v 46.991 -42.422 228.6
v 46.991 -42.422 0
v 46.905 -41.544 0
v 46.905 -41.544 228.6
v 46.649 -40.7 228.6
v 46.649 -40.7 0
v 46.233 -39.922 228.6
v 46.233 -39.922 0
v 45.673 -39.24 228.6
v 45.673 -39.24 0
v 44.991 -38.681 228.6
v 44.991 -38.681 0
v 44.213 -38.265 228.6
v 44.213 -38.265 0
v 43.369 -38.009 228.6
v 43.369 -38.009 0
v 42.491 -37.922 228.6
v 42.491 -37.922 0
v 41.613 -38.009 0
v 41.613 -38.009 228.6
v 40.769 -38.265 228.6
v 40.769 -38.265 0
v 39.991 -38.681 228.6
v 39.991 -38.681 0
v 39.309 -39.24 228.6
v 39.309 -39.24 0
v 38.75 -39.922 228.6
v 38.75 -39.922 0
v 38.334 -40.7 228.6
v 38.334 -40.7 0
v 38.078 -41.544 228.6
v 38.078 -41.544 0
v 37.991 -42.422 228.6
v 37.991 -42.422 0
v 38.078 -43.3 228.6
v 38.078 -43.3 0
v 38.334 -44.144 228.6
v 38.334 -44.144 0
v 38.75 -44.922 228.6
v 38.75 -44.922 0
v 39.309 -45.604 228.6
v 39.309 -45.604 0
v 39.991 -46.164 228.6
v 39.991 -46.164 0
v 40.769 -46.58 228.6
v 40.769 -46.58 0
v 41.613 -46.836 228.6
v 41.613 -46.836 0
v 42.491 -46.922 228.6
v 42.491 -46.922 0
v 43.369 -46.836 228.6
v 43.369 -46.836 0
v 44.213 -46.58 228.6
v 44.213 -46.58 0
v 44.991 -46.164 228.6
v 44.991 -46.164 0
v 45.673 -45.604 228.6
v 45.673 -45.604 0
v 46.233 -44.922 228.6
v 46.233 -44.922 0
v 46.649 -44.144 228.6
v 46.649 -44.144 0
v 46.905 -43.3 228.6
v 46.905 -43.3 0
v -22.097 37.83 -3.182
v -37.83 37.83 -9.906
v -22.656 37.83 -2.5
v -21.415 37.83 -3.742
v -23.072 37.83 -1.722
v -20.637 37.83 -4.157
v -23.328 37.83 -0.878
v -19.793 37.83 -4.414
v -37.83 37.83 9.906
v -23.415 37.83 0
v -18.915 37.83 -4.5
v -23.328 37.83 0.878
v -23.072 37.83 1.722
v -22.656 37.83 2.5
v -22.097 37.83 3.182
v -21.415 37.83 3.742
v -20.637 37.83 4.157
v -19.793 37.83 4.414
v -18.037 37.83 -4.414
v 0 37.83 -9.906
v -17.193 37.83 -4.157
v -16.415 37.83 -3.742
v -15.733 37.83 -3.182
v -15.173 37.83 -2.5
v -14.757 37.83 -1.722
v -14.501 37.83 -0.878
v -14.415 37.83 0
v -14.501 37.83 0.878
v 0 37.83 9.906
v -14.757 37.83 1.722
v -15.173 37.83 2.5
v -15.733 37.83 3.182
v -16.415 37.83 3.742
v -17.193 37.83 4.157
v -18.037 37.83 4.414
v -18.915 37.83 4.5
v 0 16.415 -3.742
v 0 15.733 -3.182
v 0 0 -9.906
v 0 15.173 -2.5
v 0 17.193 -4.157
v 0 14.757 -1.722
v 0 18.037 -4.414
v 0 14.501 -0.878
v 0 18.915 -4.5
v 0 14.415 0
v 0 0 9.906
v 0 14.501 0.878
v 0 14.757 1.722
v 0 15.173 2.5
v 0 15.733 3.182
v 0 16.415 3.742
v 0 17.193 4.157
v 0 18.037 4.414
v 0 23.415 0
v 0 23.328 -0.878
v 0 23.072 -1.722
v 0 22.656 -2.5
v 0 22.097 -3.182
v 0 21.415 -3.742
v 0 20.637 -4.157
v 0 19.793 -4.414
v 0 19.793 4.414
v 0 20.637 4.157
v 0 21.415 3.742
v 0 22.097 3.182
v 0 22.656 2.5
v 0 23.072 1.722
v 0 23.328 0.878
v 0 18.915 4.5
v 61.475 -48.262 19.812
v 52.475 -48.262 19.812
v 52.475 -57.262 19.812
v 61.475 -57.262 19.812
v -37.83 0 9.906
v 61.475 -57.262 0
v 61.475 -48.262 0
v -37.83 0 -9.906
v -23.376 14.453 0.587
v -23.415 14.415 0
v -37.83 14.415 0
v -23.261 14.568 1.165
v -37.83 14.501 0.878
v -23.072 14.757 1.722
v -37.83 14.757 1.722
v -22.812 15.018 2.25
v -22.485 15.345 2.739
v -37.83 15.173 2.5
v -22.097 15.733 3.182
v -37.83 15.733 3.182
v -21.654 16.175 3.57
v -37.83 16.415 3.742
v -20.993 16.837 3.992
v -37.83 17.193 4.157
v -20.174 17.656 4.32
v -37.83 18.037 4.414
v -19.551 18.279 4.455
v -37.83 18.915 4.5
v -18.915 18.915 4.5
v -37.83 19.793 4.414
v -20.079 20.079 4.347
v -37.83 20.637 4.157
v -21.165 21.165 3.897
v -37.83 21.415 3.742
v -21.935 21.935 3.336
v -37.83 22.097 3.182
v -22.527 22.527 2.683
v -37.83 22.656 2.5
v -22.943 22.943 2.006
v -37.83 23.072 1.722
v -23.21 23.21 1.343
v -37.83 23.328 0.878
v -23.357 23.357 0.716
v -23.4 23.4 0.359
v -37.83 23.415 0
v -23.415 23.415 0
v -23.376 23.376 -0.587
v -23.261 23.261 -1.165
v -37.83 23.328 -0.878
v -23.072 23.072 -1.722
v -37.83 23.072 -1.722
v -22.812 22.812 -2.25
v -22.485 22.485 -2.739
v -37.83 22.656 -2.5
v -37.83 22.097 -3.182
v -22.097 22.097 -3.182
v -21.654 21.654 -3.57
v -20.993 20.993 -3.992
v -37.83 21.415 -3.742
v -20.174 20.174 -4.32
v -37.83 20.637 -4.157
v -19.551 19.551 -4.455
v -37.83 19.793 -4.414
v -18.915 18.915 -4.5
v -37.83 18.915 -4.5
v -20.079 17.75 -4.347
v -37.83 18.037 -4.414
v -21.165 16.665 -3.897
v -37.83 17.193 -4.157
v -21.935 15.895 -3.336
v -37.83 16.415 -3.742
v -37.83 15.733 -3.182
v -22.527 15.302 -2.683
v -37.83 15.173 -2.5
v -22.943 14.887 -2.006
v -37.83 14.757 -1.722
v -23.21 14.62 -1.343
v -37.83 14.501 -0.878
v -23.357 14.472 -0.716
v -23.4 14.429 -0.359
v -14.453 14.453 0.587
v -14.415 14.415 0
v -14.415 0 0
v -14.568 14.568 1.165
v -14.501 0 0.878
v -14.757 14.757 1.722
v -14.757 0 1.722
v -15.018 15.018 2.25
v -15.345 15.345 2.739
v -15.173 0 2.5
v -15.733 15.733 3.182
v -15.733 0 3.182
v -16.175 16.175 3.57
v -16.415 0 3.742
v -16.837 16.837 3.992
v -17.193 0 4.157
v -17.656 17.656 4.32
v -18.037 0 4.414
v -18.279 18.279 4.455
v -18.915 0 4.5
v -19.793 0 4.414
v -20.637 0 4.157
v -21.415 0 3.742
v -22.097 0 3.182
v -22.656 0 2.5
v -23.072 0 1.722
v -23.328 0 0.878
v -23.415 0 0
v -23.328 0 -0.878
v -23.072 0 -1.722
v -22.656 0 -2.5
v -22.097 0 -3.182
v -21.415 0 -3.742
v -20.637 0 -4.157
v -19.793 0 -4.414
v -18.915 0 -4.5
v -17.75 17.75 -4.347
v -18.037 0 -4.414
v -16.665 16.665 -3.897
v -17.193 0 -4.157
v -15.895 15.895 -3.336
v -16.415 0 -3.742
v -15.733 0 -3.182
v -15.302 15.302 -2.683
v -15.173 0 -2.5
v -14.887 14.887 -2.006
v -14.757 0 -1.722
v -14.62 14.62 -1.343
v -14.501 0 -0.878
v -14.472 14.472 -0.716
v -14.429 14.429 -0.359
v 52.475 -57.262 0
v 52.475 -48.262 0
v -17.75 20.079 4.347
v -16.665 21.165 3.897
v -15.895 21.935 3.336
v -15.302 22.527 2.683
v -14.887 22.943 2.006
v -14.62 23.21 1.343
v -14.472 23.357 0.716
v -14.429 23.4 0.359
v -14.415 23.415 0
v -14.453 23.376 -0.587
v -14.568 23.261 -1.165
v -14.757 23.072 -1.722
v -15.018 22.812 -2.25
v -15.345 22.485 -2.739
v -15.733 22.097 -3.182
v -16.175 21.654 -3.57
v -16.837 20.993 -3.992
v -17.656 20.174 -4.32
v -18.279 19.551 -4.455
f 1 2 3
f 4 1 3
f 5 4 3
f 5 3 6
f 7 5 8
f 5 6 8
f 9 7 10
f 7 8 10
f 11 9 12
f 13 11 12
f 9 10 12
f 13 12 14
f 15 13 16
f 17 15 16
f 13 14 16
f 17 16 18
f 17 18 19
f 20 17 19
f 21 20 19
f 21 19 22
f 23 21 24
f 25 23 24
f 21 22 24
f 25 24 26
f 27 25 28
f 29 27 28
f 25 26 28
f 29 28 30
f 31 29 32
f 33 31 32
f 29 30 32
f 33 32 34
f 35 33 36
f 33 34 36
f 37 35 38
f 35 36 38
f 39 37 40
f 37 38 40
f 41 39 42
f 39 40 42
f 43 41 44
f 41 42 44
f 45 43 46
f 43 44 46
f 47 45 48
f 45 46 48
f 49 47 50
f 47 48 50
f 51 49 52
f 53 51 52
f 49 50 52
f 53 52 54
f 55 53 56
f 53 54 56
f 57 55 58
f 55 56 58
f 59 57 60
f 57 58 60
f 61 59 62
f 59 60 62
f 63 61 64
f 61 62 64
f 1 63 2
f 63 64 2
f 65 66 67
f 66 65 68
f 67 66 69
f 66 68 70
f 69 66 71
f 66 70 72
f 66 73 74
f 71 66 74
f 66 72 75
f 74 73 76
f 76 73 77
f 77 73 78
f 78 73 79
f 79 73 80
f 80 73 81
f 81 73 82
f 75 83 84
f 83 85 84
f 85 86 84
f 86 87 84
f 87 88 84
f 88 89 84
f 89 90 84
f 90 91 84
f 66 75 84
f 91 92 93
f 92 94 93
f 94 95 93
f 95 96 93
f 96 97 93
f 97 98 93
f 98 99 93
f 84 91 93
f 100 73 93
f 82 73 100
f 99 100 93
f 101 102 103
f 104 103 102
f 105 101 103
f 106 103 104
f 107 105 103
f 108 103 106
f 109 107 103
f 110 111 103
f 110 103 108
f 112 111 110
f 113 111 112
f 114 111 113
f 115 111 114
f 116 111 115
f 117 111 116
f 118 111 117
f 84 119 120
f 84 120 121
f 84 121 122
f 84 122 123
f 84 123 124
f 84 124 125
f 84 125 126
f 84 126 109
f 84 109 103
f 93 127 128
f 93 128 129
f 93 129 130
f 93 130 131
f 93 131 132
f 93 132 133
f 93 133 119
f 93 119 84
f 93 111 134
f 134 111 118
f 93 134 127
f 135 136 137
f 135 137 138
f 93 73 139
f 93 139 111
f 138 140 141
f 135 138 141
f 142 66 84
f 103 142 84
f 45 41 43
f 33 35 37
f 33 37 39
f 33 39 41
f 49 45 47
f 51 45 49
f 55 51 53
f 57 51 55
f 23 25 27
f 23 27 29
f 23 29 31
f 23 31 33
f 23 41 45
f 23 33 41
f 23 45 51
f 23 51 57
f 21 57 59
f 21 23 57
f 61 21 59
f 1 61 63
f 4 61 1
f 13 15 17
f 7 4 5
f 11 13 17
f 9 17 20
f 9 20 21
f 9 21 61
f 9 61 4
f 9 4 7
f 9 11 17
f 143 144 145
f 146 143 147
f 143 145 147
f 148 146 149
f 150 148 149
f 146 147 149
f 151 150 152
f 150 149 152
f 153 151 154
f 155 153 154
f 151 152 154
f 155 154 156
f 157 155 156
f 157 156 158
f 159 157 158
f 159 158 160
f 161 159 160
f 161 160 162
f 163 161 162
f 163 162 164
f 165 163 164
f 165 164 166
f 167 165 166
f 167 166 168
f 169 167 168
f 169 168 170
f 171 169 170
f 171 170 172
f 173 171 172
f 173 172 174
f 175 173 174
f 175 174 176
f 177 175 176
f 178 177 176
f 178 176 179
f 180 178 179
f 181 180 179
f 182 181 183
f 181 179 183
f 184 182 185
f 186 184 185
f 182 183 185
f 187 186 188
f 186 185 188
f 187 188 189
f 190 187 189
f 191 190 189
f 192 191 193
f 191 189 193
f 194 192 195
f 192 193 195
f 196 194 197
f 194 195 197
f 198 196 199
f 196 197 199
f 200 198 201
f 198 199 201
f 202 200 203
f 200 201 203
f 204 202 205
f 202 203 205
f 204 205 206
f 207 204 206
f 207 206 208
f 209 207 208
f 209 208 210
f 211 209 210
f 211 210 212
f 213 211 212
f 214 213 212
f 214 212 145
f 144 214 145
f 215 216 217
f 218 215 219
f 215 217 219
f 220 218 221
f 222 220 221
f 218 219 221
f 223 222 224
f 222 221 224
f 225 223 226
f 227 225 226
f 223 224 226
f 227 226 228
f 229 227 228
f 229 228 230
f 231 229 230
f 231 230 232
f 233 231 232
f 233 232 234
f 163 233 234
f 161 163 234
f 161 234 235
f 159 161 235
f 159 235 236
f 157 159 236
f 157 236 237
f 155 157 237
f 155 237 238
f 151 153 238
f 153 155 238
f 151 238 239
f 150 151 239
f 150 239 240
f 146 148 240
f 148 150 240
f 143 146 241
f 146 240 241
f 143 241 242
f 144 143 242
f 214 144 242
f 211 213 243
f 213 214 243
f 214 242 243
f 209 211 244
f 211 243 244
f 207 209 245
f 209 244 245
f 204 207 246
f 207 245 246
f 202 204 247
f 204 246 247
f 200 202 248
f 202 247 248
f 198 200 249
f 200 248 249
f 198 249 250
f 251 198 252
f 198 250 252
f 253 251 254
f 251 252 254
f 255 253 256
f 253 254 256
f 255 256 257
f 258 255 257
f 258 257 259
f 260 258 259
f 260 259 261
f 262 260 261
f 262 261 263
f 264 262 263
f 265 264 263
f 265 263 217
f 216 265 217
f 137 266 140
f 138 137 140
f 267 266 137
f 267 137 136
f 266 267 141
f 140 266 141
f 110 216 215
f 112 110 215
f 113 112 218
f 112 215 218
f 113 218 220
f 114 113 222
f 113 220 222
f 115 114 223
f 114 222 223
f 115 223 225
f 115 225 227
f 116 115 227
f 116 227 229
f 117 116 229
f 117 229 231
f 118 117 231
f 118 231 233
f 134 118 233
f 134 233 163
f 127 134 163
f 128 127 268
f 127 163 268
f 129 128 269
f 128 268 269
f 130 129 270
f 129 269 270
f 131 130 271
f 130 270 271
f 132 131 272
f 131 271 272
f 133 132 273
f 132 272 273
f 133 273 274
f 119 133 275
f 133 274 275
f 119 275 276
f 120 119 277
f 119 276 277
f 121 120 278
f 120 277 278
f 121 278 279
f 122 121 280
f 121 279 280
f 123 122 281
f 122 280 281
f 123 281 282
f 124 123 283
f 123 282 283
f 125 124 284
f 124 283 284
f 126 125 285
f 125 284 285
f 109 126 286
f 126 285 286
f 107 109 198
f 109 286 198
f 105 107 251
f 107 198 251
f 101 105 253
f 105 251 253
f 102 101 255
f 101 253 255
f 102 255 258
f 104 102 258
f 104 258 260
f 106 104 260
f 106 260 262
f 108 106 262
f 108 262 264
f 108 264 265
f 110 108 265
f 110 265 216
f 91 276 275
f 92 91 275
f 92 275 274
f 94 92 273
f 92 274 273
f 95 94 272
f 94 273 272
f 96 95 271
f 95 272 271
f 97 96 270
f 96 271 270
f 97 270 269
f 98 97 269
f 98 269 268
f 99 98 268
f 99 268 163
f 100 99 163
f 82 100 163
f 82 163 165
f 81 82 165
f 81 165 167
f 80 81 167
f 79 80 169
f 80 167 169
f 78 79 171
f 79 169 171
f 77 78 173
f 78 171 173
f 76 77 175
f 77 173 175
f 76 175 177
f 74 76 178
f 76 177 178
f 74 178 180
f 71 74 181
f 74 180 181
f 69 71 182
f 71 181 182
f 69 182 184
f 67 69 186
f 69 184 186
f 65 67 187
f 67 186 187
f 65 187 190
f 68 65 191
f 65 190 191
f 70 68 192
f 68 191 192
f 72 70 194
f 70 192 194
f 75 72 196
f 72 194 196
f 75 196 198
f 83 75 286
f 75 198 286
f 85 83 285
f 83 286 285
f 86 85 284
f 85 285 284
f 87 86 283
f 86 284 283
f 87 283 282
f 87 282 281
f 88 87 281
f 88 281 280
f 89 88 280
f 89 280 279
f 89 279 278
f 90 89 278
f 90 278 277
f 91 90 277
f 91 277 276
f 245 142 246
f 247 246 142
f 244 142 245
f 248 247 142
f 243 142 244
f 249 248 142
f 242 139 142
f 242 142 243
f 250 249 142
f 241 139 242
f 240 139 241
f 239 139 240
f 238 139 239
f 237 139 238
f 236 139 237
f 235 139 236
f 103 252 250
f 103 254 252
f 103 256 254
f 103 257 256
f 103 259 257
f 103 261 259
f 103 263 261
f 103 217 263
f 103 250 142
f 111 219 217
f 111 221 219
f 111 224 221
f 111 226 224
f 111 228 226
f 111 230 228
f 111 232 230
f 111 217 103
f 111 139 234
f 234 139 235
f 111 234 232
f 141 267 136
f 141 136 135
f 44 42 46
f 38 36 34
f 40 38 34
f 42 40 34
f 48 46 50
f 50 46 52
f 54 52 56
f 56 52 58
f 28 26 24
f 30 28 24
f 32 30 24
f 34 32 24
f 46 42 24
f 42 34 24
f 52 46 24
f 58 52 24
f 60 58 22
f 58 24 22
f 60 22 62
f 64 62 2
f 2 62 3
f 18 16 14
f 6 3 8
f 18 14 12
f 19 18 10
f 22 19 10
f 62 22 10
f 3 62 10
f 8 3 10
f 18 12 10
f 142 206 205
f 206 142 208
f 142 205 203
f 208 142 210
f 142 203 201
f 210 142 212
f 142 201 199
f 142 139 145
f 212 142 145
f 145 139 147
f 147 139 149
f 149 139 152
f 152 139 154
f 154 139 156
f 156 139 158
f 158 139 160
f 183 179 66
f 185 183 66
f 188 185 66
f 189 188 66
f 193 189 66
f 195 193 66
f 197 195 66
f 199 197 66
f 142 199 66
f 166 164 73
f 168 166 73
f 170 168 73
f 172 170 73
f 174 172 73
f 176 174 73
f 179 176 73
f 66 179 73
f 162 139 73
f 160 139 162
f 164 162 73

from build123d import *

# Parameters (mm, degrees)
F0_W      = 37.829503
F0_H      = 37.829503
F1_DEPTH  = 9.906
F6_D      = 9
F7_D      = 9
F8_R      = 4.5
F9_DEPTH  = 228.6
F10_W     = 9
F10_H     = 9
F11_DEPTH = 19.812


with BuildPart() as f1:
    # F0 (on Top) → F1 (new body, symmetric)
    with BuildSketch(Plane.XY):
        with Locations((-18.914751, 18.914751)):
            Rectangle(F0_W, F0_H)
    extrude(amount=F1_DEPTH, both=True)

    # F6 (through all)
    with Locations(Plane.YZ):
        with Locations((18.914752, 0), (-18.914752, 0)):
            Hole(F6_D / 2)

    # F7 (through all)
    with Locations(Plane(origin=(0, 37.829503, 0), x_dir=(-1, 0, 0), z_dir=(0, 1, 0))):
        with Locations((18.914752, 0), (-18.914752, 0)):
            Hole(F7_D / 2)


with BuildPart() as f9:
    # F8 (on Top) → F9 (new body)
    with BuildSketch(Plane.XY):
        with Locations((42.491149, -42.422224)):
            Circle(F8_R)
    extrude(amount=F9_DEPTH)


with BuildPart() as f11:
    # F10 (on Top) → F11 (new body)
    with BuildSketch(Plane.XY):
        with Locations((56.974558, -52.762169)):
            Rectangle(F10_W, F10_H)
    extrude(amount=F11_DEPTH)


solid = Compound([f1.part, f9.part, f11.part])
